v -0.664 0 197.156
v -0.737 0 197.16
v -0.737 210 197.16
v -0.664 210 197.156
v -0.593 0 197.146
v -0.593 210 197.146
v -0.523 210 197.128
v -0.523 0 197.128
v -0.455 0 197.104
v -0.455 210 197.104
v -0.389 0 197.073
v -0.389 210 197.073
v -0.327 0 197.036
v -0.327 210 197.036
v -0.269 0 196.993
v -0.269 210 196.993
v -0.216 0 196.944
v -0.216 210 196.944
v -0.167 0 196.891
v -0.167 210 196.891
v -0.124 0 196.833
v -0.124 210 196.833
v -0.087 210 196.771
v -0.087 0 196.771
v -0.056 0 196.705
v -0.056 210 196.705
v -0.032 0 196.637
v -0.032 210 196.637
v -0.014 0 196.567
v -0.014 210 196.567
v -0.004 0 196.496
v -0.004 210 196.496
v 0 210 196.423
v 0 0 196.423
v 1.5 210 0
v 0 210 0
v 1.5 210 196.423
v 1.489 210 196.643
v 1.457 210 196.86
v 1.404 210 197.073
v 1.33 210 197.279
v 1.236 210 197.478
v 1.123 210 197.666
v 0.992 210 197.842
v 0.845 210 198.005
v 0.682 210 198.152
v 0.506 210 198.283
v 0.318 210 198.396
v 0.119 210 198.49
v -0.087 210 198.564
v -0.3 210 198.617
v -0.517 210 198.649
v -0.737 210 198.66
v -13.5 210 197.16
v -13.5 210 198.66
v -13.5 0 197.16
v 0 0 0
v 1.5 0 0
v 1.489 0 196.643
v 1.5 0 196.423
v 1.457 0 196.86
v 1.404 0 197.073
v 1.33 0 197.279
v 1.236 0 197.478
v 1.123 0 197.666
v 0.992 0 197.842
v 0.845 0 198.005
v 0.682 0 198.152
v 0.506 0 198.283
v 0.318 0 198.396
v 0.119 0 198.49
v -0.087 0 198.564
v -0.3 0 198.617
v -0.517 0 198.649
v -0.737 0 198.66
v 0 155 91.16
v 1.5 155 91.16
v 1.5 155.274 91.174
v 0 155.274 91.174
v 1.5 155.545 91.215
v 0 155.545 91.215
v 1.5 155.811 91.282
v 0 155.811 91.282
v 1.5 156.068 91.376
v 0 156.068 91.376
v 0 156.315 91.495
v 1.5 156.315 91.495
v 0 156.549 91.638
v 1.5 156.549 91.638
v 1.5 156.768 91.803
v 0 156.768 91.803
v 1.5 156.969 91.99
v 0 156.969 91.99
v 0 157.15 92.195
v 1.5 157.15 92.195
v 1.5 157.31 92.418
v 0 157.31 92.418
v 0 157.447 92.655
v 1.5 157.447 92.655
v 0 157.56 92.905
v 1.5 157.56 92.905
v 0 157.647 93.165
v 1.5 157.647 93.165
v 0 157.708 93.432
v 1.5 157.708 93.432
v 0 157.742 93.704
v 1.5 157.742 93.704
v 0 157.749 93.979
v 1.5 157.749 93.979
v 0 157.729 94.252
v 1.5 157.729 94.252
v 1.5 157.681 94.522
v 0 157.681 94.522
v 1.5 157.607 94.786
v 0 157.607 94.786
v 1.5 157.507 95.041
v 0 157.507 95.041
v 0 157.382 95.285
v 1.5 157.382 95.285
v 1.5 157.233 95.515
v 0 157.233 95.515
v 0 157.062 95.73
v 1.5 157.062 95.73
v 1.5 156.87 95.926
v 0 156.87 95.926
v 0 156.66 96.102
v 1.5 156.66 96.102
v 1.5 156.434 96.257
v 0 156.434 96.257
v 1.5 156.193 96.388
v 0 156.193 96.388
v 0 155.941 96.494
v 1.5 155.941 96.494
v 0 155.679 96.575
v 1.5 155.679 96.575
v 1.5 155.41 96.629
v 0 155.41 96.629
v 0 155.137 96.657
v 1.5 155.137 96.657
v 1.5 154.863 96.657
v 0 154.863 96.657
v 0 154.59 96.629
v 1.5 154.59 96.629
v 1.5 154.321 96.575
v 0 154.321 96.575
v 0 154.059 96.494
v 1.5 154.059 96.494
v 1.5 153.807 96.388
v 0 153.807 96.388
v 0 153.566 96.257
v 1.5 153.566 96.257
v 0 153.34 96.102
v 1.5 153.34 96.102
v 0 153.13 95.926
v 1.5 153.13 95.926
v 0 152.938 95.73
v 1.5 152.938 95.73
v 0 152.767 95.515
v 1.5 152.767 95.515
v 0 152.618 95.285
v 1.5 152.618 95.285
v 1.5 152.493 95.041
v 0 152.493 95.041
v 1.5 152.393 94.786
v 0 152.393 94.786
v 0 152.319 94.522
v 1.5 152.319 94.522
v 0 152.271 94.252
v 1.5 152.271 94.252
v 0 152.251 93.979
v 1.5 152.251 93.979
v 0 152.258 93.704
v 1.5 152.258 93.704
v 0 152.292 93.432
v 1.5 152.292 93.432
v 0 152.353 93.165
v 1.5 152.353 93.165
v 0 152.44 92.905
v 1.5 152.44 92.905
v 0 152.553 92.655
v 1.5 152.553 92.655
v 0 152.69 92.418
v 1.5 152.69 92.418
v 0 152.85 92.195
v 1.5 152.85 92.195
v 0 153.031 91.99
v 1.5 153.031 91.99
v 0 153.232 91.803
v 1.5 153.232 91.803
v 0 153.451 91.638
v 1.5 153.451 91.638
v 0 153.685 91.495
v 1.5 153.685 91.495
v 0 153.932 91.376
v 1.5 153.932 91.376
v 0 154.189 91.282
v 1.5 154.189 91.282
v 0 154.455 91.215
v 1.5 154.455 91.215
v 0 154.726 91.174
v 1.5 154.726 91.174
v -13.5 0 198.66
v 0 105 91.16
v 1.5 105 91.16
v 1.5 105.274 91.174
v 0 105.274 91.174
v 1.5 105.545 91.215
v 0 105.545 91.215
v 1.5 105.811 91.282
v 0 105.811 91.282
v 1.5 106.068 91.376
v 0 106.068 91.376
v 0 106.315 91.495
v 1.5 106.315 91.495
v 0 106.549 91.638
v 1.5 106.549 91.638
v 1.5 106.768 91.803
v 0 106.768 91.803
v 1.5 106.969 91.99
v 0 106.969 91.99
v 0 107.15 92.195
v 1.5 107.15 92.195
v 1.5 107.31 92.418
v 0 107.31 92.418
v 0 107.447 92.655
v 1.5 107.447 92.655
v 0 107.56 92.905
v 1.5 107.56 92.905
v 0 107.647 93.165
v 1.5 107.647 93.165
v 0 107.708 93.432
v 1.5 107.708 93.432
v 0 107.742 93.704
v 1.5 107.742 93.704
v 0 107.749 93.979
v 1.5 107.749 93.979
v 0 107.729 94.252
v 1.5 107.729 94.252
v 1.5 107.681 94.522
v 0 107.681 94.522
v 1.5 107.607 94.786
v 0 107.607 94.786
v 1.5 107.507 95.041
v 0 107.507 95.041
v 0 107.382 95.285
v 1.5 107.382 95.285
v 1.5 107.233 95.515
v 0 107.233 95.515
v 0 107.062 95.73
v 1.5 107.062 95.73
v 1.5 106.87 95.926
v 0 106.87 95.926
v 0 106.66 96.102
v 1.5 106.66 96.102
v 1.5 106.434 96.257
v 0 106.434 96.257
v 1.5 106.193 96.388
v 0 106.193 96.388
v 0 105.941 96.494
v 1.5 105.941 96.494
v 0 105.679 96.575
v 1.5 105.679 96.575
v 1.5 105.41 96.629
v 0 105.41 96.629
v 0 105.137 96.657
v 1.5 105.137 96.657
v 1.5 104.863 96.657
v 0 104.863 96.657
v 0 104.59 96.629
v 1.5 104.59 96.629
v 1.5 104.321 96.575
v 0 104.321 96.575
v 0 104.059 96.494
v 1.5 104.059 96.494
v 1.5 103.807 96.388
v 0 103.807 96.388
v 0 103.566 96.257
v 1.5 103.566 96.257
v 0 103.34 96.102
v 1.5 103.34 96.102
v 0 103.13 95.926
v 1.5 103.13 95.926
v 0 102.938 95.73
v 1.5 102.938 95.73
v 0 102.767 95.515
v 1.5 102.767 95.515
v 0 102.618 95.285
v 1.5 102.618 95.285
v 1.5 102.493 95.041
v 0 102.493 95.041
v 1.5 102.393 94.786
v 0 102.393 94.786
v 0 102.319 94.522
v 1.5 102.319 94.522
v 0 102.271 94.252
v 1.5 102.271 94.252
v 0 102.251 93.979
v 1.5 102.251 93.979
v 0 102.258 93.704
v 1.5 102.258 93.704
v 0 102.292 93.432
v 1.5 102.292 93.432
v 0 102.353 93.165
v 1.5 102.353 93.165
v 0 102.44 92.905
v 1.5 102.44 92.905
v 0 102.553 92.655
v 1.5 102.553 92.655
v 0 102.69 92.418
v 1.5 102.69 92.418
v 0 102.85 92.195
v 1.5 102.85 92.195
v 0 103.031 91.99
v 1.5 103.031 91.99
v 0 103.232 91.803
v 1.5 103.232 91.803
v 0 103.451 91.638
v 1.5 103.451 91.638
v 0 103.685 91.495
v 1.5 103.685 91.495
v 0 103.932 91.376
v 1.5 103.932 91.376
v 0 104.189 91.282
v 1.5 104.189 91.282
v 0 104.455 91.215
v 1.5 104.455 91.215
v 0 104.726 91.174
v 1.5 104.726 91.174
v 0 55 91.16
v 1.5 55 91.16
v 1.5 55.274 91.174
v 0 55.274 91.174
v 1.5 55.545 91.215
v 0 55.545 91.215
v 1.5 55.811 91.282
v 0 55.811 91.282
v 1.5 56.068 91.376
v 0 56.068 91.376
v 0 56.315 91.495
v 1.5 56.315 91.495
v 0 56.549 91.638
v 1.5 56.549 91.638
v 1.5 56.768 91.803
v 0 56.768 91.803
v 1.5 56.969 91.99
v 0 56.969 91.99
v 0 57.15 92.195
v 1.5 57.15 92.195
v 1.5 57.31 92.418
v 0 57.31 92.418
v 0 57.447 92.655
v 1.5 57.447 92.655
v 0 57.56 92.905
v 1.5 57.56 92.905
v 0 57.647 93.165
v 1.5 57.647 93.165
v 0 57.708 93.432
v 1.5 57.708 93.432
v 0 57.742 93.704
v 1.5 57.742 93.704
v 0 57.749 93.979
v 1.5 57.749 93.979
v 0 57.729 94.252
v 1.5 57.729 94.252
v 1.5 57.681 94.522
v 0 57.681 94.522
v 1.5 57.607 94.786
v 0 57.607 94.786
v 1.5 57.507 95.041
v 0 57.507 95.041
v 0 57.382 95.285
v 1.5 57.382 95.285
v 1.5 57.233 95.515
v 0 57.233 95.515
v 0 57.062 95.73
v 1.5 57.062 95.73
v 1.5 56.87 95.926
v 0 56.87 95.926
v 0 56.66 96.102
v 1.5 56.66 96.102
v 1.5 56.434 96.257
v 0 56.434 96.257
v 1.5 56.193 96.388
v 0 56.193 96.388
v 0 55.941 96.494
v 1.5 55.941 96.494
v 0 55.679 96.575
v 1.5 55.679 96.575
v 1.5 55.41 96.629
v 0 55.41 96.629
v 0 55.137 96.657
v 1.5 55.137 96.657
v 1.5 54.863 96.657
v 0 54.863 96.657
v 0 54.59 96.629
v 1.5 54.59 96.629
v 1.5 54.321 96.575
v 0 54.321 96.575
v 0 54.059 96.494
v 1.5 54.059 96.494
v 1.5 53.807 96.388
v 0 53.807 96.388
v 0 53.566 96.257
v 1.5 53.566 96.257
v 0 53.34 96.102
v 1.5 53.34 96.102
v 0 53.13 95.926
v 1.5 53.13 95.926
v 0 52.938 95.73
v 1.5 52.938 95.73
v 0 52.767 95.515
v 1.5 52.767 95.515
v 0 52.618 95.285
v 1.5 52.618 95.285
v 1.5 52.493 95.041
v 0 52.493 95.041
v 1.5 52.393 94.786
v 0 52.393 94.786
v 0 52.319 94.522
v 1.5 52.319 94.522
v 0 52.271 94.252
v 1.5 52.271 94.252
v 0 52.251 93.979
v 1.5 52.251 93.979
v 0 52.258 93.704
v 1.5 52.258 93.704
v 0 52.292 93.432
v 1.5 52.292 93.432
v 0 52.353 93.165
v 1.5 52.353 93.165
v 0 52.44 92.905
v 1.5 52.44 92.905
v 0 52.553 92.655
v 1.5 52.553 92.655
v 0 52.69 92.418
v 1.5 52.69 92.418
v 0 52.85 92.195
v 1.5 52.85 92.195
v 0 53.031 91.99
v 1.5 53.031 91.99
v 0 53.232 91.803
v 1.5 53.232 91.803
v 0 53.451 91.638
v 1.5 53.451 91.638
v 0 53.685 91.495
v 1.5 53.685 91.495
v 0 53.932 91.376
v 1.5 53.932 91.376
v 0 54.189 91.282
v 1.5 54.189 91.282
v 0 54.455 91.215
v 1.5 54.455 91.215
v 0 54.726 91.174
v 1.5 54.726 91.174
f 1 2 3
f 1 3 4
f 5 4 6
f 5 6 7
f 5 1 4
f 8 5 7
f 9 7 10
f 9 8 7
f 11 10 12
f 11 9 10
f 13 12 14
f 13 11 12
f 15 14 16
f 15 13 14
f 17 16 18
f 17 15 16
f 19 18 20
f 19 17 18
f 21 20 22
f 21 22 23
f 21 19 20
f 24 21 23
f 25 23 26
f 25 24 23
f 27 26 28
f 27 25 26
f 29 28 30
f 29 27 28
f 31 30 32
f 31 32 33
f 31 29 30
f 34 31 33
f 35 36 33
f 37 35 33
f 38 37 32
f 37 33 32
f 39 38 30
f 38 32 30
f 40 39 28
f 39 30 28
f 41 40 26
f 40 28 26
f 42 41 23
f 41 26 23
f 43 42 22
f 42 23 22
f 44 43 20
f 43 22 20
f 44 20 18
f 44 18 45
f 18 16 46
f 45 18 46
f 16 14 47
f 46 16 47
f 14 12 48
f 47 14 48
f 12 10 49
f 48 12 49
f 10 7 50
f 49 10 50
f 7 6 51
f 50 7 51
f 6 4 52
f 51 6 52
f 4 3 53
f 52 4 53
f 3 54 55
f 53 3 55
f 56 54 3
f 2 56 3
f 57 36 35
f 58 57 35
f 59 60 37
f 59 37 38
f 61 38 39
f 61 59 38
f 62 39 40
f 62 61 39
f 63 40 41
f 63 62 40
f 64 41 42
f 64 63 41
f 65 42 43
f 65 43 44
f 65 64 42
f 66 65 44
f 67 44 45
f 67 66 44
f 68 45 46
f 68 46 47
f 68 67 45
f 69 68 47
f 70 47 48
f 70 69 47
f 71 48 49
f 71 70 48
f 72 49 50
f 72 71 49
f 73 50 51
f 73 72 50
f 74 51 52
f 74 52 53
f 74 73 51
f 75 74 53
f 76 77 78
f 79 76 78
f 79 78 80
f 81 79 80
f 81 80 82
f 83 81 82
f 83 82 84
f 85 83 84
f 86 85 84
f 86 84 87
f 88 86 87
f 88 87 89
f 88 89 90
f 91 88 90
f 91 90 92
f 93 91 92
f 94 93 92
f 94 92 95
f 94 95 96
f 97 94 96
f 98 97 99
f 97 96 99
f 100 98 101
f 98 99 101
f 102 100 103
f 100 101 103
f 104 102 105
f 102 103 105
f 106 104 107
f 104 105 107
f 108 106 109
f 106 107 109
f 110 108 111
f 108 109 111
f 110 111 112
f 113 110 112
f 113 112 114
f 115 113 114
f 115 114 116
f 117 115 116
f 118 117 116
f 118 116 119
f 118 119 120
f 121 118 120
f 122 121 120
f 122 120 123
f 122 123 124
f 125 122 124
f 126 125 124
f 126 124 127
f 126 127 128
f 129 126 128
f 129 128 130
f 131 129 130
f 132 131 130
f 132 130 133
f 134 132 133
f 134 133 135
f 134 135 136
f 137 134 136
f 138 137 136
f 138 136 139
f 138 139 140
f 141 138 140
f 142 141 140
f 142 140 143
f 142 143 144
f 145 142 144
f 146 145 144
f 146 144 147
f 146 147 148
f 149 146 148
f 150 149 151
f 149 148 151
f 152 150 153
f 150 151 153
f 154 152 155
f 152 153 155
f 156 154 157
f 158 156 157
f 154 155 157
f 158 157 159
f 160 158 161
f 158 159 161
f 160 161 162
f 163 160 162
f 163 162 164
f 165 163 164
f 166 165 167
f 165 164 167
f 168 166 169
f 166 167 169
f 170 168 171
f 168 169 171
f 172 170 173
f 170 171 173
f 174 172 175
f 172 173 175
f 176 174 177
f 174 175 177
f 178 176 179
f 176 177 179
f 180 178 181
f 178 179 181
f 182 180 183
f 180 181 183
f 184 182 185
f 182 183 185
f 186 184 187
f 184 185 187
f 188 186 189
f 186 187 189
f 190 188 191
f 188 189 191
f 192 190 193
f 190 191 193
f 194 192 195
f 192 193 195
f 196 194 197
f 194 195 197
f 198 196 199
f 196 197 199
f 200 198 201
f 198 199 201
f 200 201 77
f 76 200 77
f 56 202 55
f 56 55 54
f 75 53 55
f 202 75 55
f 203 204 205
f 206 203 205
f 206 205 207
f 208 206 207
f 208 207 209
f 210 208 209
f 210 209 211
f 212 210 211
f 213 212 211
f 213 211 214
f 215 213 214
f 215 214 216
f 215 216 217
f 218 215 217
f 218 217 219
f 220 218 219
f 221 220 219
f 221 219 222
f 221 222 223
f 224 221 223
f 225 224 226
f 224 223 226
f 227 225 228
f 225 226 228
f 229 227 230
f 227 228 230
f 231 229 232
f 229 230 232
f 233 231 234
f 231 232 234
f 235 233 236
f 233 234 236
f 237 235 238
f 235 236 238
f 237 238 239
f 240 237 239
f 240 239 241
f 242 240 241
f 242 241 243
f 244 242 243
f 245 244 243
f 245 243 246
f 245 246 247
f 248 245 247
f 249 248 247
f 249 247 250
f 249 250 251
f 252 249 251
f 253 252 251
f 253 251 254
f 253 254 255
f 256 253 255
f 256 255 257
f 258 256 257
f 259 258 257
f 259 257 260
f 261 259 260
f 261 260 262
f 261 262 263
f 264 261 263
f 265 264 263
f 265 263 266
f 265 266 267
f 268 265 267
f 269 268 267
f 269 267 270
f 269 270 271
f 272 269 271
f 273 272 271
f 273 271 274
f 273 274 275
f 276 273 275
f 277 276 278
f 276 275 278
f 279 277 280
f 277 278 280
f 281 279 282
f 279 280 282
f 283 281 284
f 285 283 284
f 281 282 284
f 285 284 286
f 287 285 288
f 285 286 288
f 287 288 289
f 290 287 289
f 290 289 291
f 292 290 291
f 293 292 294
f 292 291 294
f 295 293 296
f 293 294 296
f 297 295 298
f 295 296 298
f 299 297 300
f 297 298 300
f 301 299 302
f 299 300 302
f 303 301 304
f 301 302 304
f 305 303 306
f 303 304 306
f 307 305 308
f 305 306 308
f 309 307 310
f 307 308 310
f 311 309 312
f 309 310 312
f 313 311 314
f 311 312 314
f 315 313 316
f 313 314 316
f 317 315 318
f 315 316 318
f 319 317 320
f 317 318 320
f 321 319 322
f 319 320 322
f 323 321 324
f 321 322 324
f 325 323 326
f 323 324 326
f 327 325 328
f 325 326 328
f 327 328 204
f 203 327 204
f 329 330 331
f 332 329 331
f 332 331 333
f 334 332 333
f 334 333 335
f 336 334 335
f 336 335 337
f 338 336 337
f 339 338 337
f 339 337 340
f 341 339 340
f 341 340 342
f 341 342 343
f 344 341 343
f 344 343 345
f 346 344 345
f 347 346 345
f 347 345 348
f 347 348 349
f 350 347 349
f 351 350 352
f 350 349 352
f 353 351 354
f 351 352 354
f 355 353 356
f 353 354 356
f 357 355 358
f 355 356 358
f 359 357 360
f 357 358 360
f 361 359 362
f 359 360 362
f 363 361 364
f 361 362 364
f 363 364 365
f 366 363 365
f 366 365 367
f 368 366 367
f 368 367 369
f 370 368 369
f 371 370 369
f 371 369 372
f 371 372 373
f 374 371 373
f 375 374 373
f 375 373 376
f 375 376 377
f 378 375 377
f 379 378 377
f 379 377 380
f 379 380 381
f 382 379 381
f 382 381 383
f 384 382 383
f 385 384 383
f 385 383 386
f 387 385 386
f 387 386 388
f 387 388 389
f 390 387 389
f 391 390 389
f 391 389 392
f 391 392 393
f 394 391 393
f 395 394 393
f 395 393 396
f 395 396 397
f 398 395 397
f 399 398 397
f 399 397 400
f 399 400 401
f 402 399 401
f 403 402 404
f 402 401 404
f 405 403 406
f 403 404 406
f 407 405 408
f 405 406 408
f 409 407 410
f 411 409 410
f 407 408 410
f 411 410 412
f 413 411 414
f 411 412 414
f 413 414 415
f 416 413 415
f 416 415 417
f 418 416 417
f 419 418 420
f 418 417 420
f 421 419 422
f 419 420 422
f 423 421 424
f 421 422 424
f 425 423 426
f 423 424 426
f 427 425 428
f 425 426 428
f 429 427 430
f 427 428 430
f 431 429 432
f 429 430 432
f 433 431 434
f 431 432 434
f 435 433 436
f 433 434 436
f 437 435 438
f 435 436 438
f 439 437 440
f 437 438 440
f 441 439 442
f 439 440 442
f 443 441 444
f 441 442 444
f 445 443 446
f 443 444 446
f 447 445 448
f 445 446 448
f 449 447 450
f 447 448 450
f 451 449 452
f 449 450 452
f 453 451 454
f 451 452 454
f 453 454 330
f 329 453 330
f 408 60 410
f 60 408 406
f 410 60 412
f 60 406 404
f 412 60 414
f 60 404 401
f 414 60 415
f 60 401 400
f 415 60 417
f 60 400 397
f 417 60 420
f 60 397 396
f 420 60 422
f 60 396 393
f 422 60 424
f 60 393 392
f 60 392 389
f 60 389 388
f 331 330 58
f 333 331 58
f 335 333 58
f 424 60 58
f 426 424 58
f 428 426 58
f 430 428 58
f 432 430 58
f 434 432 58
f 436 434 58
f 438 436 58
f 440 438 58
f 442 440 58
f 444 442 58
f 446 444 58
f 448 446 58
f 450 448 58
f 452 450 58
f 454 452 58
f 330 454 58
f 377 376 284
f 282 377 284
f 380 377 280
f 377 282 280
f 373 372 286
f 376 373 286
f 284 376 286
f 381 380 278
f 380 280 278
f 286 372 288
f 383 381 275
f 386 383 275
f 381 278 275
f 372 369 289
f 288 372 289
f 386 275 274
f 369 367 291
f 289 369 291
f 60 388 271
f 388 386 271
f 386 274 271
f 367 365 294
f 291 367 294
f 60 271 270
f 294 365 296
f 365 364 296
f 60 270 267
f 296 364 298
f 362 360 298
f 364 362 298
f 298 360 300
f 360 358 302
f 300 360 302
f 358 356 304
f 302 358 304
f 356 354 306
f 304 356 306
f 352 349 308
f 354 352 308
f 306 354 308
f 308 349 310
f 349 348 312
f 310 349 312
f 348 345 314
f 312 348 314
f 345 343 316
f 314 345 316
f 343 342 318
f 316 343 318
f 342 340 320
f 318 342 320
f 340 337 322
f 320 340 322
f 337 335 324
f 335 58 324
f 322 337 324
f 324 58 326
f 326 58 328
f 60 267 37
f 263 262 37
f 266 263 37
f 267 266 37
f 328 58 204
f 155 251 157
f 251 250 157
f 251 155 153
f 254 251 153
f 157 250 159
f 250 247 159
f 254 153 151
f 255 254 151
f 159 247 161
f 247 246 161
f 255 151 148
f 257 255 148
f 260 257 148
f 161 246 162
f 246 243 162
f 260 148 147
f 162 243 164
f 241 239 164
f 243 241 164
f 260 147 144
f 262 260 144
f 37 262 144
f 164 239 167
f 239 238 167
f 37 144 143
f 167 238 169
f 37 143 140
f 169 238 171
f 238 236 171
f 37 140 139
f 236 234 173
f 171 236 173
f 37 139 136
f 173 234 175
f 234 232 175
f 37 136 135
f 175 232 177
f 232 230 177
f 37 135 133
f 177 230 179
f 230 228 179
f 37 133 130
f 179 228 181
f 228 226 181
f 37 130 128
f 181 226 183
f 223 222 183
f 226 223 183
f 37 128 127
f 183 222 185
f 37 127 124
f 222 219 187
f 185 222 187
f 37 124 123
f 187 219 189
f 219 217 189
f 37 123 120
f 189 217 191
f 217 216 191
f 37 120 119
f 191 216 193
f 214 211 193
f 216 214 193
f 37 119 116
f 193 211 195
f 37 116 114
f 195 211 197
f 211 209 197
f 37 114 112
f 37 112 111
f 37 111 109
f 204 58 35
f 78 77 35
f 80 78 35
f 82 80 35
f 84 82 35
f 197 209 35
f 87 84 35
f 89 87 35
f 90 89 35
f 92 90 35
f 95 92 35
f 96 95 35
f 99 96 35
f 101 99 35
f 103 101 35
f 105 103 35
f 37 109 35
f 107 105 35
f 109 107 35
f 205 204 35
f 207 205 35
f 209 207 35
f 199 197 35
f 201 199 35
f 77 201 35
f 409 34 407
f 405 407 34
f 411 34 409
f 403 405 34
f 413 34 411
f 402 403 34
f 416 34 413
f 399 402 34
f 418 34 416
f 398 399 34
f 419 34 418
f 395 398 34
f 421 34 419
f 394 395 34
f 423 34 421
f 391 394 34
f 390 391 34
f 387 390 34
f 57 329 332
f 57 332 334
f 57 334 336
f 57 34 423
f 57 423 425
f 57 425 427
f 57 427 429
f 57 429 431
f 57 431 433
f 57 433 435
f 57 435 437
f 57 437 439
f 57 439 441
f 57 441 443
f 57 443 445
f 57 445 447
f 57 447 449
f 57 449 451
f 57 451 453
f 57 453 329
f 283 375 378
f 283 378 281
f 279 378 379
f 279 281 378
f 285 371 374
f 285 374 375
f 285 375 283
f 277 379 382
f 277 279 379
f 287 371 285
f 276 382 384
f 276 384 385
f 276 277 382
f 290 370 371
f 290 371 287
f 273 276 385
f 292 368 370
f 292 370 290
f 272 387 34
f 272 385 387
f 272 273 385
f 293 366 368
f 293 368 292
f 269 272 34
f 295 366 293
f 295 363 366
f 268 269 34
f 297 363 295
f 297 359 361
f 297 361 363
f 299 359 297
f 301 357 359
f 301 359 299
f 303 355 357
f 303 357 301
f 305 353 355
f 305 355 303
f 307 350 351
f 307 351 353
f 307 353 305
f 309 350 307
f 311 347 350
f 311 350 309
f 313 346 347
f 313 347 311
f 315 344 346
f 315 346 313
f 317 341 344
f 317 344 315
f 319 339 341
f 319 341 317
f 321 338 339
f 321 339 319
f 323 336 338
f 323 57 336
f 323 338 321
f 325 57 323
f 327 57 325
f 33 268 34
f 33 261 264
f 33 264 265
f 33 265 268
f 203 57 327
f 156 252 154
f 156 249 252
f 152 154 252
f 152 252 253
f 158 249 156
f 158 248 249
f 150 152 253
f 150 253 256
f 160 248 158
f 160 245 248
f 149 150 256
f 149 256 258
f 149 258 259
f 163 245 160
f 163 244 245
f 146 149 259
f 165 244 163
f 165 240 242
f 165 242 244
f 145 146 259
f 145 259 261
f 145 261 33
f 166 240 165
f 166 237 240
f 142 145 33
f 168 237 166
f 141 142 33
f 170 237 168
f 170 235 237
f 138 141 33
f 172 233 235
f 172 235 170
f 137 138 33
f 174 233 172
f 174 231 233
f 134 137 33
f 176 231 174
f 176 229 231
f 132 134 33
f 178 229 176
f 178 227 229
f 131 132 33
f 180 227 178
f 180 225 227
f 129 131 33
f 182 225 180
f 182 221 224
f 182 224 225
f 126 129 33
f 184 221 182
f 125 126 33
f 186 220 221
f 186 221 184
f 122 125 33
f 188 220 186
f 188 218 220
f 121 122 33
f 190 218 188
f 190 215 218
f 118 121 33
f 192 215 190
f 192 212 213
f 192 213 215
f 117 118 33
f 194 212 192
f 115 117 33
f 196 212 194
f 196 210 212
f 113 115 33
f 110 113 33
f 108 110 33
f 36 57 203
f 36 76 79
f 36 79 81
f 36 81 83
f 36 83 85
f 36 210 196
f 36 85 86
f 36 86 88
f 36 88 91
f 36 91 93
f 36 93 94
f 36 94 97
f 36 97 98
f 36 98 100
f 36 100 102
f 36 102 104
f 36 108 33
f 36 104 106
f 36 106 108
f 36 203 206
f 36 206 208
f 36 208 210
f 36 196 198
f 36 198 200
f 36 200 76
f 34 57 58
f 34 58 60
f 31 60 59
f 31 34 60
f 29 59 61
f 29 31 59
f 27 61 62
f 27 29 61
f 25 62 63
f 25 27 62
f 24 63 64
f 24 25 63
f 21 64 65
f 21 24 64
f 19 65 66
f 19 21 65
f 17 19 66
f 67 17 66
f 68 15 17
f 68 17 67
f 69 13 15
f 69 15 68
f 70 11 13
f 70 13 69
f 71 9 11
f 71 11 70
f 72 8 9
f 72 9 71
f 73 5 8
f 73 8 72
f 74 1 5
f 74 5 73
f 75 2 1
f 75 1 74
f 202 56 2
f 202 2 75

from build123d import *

# Parameters (mm, degrees)
SKETCH_1_W                       = 1.5
SKETCH_1_H                       = 210
SM_BASE_FLANGE_1_DEPTH           = 198.66
SKETCH_6_R                       = 2.75
CUT_EXTRUDE_1_DEPTH              = 10
SM_EDGE_FLANGE_1_STRIP_W         = 7.4732
SM_EDGE_FLANGE_1_STRIP_H         = 1.5
SM_EDGE_FLANGE_1_STRIP_CUT_DEPTH = 210
SM_EDGE_FLANGE_1_DEPTH           = 210


# Sheet-metal steps are written as plain solids
with BuildPart() as part:
    # Sketch 1 → 基体-法兰1 (new body)
    with BuildSketch(Plane.XY):
        with Locations((0.75, 105)):
            Rectangle(SKETCH_1_W, SKETCH_1_H)
    extrude(amount=SM_BASE_FLANGE_1_DEPTH)

    # 草图6 → 切除-拉伸1 (cut)
    with BuildSketch(Plane(origin=(1.5, 0, 0), x_dir=(0, 0, -1), z_dir=(1, 0, 0))):
        with Locations((-93.91, 55)):
            Circle(SKETCH_6_R)
        with Locations((-93.91, 155)):
            Circle(SKETCH_6_R)
        with Locations((-93.91, 105)):
            Circle(SKETCH_6_R)
    extrude(amount=-CUT_EXTRUDE_1_DEPTH, mode=Mode.SUBTRACT)

    # 边线-法兰1 strip (across the edge) → 边线-法兰1 strip cut (cut)
    with BuildSketch(Plane(origin=(0, 0, 198.66), x_dir=(0, 0, -1), z_dir=(0, 1, 0))):
        with Locations((-1.5, -0.75)):
            Rectangle(SM_EDGE_FLANGE_1_STRIP_W, SM_EDGE_FLANGE_1_STRIP_H)
    extrude(amount=SM_EDGE_FLANGE_1_STRIP_CUT_DEPTH, mode=Mode.SUBTRACT)

    # 边线-法兰1 section (across the edge) → 边线-法兰1 (add)
    with BuildSketch(Plane(origin=(0, 0, 198.66), x_dir=(0, 0, -1), z_dir=(0, 1, 0))):
        with BuildLine():
            Line((0, 0.7366), (0, 13.5))
            Line((0, 13.5), (1.5, 13.5))
            Line((1.5, 13.5), (1.5, 0.7366))
            ThreePointArc((1.5, 0.7366), (1.715745145, 0.215745145), (2.2366, 0))
            Line((2.2366, 0), (2.2366, -1.5))
            ThreePointArc((2.2366, -1.5), (0.655084973, -0.844915027), (0, 0.7366))
        make_face()
    extrude(amount=SM_EDGE_FLANGE_1_DEPTH)


solid = part.part
